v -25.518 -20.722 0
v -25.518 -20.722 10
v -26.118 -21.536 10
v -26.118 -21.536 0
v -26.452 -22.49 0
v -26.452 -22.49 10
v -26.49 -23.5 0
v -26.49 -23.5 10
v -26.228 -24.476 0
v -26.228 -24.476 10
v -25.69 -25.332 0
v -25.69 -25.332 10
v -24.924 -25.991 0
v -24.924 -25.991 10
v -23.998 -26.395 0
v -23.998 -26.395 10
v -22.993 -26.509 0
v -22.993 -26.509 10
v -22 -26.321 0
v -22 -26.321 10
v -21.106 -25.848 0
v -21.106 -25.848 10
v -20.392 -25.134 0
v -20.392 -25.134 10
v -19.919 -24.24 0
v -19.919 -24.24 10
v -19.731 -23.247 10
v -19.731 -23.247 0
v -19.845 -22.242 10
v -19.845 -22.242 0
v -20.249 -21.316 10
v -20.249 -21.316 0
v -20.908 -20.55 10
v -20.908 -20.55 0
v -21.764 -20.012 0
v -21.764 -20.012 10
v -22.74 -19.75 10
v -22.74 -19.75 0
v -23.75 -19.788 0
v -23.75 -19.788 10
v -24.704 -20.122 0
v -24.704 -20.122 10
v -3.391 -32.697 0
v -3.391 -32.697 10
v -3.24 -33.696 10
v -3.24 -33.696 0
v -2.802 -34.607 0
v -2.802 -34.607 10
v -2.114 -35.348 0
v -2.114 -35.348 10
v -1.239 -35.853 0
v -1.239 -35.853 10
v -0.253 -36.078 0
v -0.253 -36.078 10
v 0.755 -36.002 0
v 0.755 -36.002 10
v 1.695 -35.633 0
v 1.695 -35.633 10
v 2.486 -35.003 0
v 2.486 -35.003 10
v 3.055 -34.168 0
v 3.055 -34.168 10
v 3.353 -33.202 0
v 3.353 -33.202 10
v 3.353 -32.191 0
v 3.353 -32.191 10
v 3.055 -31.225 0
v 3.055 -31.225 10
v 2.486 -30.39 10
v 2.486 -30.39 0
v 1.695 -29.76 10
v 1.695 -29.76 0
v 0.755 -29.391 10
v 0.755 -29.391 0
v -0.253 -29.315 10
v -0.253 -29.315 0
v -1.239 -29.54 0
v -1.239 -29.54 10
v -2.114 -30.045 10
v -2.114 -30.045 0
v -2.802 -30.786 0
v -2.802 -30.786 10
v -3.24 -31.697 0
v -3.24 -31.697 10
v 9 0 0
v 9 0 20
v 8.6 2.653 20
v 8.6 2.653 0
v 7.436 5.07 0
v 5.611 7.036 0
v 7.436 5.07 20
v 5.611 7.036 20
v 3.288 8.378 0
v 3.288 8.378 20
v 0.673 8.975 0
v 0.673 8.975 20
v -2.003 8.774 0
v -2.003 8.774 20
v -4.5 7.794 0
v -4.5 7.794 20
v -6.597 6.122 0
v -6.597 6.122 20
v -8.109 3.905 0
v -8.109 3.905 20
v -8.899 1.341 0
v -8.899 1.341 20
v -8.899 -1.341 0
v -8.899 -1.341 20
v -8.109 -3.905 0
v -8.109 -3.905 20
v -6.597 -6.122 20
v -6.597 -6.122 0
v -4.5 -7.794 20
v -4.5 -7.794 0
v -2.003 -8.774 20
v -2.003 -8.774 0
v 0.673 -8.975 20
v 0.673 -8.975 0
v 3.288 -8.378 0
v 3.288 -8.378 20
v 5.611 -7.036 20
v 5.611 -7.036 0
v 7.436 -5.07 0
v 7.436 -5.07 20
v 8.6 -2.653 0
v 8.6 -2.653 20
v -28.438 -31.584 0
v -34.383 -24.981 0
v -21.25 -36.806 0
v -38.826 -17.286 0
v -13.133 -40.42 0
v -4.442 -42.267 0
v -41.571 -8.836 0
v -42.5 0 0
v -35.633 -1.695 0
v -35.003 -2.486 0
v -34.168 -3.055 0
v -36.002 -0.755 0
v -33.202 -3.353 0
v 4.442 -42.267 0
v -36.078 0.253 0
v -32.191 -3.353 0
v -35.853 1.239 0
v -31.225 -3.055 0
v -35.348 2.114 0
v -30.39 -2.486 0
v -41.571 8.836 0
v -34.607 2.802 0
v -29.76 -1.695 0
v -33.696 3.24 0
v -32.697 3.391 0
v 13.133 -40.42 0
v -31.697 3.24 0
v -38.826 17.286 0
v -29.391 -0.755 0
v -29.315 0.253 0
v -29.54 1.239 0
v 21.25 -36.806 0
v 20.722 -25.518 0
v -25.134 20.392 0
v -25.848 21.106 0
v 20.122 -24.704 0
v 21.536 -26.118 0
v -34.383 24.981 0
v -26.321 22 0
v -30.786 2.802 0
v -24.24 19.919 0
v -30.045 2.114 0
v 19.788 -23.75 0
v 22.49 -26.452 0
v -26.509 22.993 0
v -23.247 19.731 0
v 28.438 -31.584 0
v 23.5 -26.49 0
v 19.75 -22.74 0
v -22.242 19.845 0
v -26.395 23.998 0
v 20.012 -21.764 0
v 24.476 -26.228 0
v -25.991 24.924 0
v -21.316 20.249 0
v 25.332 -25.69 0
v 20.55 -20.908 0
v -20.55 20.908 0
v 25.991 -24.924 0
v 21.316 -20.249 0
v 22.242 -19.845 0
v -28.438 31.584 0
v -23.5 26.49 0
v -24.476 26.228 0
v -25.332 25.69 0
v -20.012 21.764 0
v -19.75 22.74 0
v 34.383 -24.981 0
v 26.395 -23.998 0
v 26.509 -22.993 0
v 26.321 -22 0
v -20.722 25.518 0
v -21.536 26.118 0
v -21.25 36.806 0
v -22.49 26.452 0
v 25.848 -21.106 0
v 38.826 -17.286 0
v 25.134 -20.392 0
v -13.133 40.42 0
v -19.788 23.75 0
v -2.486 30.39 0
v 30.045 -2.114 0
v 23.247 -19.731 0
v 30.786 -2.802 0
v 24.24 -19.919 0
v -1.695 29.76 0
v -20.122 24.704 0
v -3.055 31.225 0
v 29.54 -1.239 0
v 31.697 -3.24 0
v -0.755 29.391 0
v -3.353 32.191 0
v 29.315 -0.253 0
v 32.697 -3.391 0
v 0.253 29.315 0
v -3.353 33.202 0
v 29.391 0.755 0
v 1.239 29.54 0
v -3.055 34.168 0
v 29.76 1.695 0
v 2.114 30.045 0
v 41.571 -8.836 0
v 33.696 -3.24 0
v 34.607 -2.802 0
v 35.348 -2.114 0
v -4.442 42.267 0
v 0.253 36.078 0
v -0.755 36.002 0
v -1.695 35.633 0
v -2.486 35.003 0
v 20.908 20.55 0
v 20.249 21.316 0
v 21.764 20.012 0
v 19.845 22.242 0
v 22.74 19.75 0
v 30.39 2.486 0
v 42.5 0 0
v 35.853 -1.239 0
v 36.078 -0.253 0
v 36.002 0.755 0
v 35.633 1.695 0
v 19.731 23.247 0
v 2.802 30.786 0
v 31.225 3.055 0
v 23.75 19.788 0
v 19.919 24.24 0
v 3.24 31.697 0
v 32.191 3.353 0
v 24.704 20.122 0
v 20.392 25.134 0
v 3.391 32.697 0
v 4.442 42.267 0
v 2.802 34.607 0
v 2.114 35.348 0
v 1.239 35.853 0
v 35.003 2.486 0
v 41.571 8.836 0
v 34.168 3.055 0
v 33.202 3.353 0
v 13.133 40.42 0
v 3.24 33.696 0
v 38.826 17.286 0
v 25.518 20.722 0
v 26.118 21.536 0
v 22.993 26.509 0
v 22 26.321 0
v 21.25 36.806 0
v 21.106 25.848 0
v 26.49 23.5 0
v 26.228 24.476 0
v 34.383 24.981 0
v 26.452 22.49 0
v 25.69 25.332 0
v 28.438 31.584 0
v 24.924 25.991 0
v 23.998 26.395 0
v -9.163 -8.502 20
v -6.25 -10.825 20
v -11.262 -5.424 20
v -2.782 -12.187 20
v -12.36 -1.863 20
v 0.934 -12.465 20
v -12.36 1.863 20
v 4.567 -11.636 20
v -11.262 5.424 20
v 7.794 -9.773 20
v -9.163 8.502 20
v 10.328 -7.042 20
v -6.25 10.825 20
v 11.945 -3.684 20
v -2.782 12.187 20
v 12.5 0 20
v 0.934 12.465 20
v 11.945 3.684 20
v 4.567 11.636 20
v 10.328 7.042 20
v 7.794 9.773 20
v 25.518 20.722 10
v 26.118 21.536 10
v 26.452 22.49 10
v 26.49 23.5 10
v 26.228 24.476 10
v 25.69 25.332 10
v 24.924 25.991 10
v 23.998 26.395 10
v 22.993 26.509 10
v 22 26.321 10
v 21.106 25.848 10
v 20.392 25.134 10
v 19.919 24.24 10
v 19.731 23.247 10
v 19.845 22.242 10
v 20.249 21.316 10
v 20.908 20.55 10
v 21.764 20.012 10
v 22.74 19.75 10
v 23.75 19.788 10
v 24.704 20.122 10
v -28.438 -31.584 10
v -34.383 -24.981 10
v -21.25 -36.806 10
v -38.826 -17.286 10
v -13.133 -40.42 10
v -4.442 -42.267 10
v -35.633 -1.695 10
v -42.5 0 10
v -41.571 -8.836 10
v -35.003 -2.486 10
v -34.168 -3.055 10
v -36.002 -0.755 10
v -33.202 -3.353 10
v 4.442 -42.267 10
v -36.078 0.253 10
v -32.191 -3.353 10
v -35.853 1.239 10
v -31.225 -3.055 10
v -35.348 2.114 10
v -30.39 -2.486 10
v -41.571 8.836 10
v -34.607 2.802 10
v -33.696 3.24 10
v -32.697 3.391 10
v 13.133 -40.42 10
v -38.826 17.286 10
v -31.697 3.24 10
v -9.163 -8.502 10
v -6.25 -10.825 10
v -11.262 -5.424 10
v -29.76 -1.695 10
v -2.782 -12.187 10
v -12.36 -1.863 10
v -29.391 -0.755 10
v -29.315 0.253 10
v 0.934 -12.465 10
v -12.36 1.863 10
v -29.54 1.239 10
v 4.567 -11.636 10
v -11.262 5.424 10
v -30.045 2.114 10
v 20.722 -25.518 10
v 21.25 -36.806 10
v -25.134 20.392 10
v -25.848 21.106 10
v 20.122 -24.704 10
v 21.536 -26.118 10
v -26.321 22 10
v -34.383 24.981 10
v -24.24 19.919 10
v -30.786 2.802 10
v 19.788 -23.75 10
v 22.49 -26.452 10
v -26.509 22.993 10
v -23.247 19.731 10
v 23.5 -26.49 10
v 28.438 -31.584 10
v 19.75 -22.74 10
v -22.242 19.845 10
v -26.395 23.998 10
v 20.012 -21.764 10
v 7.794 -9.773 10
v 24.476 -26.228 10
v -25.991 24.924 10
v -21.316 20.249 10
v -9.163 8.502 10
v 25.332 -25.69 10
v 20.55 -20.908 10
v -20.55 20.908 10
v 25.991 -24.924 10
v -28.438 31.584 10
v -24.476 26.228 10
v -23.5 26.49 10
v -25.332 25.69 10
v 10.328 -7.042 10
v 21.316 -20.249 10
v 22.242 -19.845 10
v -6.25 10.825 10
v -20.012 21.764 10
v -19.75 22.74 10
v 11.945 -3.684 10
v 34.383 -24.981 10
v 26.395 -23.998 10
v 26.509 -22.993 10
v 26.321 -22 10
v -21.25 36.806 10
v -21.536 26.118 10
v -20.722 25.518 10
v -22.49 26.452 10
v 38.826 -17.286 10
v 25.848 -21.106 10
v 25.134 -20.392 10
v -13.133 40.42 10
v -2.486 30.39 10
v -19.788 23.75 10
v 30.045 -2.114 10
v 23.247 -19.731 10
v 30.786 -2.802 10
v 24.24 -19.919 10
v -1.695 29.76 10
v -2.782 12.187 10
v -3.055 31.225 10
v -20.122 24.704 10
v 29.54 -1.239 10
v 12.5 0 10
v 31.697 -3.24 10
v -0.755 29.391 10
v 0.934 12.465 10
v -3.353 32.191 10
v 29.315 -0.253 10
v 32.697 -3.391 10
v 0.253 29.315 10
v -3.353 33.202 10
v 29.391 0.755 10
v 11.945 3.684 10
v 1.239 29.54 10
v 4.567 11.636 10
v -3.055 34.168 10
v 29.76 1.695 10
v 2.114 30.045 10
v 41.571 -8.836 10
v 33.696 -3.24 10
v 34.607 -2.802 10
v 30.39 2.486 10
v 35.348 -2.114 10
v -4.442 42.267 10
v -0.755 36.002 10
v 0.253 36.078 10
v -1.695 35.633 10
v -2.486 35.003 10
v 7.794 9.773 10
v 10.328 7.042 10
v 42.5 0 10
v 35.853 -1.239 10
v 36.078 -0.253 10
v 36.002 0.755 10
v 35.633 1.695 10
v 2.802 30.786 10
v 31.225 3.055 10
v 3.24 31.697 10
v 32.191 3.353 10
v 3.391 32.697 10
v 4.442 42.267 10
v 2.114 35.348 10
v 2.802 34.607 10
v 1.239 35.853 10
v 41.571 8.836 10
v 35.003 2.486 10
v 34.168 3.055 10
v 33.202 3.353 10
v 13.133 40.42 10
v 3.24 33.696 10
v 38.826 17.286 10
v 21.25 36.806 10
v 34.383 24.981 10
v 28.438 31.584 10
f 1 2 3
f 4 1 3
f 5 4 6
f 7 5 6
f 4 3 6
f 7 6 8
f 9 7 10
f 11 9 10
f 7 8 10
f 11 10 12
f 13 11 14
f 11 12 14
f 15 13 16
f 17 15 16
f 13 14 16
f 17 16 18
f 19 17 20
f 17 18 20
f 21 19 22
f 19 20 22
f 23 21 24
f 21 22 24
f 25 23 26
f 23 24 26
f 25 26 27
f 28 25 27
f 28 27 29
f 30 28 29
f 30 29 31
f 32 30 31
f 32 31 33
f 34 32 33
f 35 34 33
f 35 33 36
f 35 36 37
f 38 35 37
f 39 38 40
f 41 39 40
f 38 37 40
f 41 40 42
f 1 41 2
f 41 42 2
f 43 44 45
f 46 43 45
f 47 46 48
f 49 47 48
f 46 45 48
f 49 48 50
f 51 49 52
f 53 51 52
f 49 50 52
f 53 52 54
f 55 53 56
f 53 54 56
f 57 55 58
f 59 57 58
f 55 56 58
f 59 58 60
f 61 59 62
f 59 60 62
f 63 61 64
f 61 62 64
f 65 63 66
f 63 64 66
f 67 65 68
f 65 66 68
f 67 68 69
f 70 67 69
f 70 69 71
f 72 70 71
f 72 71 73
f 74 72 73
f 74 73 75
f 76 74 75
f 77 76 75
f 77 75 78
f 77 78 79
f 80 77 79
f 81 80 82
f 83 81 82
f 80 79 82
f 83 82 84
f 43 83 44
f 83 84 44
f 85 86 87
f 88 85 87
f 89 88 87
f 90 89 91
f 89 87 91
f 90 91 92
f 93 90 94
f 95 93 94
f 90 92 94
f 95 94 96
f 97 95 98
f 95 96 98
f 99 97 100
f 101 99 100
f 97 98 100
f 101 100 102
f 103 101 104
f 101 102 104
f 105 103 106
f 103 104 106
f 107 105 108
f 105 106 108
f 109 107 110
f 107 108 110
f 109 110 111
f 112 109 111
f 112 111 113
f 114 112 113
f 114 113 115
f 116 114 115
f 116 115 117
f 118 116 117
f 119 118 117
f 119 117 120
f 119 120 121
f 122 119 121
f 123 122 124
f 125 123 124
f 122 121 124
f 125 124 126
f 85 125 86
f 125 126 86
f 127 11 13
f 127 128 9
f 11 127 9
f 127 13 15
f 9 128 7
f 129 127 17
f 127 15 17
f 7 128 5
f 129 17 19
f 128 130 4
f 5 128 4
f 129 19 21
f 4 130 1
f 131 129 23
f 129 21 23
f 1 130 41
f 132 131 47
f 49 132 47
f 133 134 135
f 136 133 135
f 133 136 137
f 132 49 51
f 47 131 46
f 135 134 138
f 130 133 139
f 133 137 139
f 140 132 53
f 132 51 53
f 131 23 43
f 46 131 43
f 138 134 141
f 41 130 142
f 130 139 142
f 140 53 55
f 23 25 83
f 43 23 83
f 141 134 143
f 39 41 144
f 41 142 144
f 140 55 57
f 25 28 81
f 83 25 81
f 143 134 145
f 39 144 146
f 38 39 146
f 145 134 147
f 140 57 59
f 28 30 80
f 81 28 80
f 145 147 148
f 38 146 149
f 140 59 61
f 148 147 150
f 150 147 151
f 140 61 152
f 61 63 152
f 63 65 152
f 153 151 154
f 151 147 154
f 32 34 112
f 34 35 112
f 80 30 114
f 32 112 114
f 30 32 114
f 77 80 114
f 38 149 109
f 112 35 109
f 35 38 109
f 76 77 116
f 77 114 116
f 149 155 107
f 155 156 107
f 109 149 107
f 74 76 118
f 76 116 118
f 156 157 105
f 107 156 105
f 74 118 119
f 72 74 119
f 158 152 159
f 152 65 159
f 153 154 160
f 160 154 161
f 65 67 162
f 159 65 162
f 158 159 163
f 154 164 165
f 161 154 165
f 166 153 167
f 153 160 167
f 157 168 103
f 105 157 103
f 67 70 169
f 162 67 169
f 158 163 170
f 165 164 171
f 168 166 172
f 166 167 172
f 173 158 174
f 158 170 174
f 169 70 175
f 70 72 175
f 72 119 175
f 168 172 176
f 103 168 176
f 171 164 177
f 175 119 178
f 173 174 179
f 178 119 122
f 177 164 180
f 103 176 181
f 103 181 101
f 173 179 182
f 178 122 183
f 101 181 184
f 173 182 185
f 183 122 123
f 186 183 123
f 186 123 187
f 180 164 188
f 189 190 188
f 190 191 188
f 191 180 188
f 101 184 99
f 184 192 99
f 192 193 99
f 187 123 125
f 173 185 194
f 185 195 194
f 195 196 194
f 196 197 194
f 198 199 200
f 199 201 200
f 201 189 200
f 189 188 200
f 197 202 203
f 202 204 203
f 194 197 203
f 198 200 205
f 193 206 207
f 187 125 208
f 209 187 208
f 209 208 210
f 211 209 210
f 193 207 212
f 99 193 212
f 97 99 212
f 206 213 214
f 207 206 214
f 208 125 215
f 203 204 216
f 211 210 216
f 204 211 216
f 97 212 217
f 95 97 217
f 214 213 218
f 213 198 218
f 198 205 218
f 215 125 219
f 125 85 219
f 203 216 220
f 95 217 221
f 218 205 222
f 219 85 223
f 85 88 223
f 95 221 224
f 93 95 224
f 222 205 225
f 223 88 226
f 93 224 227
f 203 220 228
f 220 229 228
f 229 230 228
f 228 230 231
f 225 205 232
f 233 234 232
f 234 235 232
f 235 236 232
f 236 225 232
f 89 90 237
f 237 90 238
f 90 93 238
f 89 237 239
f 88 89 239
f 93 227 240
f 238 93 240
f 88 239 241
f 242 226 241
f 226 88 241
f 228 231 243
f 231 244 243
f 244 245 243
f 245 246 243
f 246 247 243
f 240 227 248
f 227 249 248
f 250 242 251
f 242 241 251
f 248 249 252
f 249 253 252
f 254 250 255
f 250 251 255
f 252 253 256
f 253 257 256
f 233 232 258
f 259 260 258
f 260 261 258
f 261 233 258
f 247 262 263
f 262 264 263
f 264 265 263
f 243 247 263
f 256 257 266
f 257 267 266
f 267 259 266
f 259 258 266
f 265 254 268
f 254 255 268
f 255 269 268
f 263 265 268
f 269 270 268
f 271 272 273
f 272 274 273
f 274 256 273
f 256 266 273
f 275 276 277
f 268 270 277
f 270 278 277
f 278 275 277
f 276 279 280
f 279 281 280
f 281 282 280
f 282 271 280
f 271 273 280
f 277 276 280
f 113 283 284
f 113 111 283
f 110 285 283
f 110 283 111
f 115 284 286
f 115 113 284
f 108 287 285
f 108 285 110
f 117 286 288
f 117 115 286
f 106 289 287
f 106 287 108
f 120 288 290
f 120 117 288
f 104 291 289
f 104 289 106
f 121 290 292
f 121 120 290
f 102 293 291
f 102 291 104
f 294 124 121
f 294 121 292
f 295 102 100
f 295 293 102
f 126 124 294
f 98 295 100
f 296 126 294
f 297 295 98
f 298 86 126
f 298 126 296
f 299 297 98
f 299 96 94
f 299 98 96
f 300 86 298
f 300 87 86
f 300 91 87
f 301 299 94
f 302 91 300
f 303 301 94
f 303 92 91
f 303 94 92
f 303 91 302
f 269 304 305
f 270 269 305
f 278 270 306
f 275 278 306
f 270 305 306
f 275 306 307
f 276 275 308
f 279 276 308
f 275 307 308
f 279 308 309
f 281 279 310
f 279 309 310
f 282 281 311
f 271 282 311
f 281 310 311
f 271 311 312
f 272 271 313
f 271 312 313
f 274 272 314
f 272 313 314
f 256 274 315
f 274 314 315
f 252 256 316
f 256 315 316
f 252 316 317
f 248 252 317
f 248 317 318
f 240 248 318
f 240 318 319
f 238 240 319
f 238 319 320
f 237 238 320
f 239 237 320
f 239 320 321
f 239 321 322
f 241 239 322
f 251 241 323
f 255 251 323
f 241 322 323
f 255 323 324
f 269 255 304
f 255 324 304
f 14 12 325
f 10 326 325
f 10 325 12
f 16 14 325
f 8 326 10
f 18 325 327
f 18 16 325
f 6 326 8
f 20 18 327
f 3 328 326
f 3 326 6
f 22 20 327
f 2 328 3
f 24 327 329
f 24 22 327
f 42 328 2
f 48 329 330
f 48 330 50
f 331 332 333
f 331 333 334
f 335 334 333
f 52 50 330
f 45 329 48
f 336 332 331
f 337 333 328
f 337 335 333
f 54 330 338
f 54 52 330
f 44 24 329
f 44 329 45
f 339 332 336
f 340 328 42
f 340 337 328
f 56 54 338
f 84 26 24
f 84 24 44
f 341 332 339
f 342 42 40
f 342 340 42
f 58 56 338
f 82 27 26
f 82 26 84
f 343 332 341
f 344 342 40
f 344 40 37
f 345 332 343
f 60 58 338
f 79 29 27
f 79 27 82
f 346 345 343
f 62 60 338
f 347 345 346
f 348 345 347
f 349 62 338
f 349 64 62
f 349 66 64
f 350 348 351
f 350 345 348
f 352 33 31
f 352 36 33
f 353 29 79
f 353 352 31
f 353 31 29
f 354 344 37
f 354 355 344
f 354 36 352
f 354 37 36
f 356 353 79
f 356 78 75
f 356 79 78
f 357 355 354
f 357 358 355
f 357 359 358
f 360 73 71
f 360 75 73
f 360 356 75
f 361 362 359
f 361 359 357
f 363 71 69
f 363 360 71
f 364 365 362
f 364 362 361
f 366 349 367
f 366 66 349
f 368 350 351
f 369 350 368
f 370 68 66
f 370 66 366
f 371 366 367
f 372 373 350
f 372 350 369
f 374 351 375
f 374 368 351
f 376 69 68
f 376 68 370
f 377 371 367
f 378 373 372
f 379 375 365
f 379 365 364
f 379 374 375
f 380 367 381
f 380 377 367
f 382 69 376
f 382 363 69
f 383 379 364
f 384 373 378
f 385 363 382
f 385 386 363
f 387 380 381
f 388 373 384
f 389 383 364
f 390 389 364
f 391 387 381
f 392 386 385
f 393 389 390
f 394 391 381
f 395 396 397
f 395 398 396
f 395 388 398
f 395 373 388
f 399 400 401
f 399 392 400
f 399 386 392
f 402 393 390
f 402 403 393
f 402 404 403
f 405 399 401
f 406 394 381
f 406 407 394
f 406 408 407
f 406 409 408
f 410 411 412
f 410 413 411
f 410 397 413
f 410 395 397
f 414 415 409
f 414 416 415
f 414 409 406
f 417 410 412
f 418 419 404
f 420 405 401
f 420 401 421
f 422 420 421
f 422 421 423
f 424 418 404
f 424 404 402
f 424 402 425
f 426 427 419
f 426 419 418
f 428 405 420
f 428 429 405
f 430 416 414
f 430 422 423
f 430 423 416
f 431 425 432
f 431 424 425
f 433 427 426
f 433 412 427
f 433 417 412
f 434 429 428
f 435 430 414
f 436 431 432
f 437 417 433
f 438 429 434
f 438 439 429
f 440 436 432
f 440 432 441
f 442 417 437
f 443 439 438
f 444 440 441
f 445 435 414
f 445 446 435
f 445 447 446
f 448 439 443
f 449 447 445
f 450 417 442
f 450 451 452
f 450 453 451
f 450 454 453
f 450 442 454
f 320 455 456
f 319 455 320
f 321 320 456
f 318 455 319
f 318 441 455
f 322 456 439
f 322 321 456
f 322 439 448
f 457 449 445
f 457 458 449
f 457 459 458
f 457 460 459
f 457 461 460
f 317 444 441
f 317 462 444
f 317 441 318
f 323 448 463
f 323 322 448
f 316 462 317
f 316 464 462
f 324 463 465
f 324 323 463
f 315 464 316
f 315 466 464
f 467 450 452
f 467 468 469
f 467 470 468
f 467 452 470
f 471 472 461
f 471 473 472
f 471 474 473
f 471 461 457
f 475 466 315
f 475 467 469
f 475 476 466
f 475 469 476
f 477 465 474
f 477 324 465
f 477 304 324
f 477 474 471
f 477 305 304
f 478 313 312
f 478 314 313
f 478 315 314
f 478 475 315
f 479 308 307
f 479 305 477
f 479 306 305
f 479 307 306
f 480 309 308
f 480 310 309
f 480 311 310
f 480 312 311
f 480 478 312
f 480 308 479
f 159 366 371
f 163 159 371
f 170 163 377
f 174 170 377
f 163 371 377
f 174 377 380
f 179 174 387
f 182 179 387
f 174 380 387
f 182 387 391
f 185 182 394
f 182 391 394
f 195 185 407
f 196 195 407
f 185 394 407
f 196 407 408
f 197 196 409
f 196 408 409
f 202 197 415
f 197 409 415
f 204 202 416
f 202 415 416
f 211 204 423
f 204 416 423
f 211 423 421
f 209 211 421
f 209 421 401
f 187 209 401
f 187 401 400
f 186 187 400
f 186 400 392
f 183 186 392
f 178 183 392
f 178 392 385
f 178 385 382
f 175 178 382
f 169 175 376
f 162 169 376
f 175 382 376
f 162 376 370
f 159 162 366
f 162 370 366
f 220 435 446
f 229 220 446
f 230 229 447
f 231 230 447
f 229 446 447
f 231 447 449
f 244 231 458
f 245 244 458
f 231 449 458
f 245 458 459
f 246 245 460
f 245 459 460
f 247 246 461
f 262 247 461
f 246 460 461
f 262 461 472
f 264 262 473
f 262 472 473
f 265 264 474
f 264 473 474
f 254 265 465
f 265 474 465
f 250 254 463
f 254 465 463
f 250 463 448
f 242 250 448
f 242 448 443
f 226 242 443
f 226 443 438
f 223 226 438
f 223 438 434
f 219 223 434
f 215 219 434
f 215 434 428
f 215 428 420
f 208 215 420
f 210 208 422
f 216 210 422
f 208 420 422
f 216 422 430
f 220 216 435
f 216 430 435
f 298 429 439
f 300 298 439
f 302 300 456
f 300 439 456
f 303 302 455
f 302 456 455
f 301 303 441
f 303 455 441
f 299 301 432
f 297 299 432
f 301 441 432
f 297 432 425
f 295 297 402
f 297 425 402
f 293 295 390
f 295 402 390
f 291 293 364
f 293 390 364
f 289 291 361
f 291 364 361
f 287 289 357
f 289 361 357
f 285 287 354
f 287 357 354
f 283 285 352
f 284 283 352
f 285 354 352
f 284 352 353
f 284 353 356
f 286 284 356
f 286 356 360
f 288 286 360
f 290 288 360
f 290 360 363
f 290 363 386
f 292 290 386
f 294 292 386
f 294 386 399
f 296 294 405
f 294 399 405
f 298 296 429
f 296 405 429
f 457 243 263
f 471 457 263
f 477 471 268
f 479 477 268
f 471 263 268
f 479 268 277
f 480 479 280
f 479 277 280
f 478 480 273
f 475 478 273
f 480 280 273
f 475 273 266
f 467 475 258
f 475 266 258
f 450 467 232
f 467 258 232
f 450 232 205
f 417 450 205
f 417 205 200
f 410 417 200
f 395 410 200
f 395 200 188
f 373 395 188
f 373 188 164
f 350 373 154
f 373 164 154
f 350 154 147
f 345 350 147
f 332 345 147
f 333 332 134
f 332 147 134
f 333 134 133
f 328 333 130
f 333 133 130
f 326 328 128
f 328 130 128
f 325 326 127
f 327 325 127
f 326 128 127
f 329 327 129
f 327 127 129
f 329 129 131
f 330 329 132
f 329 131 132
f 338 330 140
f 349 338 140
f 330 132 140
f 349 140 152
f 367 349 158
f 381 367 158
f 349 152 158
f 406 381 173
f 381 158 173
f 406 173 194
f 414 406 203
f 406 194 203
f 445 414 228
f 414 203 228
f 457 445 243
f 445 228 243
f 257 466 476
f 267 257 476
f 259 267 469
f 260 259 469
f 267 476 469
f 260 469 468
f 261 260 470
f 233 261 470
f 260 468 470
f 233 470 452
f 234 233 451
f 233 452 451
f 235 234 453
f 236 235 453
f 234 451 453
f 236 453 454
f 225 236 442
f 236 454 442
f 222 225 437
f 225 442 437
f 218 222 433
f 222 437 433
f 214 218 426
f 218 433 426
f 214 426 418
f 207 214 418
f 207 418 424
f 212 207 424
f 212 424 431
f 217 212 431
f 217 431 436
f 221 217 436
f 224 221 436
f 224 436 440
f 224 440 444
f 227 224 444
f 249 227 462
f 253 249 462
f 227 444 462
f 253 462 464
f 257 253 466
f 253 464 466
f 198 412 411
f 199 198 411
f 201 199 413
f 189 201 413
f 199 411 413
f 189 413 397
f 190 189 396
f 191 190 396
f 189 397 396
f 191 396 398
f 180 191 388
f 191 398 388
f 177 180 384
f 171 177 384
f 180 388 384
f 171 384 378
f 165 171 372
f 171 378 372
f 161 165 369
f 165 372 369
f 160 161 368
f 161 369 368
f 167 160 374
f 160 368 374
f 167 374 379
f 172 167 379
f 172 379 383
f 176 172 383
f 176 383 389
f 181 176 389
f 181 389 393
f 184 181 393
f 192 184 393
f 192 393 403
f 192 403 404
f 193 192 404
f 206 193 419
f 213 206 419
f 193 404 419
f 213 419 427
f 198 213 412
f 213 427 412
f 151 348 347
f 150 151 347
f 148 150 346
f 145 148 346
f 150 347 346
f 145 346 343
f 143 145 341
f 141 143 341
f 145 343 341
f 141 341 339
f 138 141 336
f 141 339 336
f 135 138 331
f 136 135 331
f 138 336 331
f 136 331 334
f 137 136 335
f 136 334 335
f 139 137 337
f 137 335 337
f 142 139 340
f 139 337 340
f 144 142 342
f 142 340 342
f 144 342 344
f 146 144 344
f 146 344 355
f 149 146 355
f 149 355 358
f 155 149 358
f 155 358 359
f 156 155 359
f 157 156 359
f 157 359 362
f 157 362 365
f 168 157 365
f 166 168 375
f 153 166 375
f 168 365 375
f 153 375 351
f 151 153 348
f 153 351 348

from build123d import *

# Parameters (mm, degrees)
SKETCH1_R           = 42.5
BOSS_EXTRUDE1_DEPTH = 10
SKETCH2_R           = 12.5
BOSS_EXTRUDE2_DEPTH = 10
SKETCH3_R           = 9
CUT_EXTRUDE1_DEPTH  = 20
SKETCH4_R           = 3.390899264
CUT_EXTRUDE2_DEPTH  = 10
CIRPATTERN1_COUNT   = 8


with BuildPart() as part:
    # Sketch1 → Boss-Extrude1 (new body)
    with BuildSketch(Plane.XY):
        Circle(SKETCH1_R)
    extrude(amount=BOSS_EXTRUDE1_DEPTH)

    # Sketch2 → Boss-Extrude2 (add)
    with BuildSketch(Plane.XY.offset(10)):
        Circle(SKETCH2_R)
    extrude(amount=BOSS_EXTRUDE2_DEPTH)

    # Sketch3 → Cut-Extrude1 (cut)
    with BuildSketch(Plane.XY.offset(20)):
        Circle(SKETCH3_R)
    extrude(amount=-CUT_EXTRUDE1_DEPTH, mode=Mode.SUBTRACT)

    # Sketch4 → Cut-Extrude2 (cut)
    with BuildSketch(Plane.XY.offset(10)):
        with Locations((0, 32.696600748)):
            Circle(SKETCH4_R)
    cut_extrude2 = extrude(amount=-CUT_EXTRUDE2_DEPTH, mode=Mode.SUBTRACT)

    # CirPattern1: Cut-Extrude2 ×8 about axis
    cirpattern1_axis = Axis((0, 0, 0), (0, 0, 1))
    for i in range(1, CIRPATTERN1_COUNT):
        add(cut_extrude2.rotate(cirpattern1_axis, i * 360 / CIRPATTERN1_COUNT), mode=Mode.SUBTRACT)


solid = part.part
